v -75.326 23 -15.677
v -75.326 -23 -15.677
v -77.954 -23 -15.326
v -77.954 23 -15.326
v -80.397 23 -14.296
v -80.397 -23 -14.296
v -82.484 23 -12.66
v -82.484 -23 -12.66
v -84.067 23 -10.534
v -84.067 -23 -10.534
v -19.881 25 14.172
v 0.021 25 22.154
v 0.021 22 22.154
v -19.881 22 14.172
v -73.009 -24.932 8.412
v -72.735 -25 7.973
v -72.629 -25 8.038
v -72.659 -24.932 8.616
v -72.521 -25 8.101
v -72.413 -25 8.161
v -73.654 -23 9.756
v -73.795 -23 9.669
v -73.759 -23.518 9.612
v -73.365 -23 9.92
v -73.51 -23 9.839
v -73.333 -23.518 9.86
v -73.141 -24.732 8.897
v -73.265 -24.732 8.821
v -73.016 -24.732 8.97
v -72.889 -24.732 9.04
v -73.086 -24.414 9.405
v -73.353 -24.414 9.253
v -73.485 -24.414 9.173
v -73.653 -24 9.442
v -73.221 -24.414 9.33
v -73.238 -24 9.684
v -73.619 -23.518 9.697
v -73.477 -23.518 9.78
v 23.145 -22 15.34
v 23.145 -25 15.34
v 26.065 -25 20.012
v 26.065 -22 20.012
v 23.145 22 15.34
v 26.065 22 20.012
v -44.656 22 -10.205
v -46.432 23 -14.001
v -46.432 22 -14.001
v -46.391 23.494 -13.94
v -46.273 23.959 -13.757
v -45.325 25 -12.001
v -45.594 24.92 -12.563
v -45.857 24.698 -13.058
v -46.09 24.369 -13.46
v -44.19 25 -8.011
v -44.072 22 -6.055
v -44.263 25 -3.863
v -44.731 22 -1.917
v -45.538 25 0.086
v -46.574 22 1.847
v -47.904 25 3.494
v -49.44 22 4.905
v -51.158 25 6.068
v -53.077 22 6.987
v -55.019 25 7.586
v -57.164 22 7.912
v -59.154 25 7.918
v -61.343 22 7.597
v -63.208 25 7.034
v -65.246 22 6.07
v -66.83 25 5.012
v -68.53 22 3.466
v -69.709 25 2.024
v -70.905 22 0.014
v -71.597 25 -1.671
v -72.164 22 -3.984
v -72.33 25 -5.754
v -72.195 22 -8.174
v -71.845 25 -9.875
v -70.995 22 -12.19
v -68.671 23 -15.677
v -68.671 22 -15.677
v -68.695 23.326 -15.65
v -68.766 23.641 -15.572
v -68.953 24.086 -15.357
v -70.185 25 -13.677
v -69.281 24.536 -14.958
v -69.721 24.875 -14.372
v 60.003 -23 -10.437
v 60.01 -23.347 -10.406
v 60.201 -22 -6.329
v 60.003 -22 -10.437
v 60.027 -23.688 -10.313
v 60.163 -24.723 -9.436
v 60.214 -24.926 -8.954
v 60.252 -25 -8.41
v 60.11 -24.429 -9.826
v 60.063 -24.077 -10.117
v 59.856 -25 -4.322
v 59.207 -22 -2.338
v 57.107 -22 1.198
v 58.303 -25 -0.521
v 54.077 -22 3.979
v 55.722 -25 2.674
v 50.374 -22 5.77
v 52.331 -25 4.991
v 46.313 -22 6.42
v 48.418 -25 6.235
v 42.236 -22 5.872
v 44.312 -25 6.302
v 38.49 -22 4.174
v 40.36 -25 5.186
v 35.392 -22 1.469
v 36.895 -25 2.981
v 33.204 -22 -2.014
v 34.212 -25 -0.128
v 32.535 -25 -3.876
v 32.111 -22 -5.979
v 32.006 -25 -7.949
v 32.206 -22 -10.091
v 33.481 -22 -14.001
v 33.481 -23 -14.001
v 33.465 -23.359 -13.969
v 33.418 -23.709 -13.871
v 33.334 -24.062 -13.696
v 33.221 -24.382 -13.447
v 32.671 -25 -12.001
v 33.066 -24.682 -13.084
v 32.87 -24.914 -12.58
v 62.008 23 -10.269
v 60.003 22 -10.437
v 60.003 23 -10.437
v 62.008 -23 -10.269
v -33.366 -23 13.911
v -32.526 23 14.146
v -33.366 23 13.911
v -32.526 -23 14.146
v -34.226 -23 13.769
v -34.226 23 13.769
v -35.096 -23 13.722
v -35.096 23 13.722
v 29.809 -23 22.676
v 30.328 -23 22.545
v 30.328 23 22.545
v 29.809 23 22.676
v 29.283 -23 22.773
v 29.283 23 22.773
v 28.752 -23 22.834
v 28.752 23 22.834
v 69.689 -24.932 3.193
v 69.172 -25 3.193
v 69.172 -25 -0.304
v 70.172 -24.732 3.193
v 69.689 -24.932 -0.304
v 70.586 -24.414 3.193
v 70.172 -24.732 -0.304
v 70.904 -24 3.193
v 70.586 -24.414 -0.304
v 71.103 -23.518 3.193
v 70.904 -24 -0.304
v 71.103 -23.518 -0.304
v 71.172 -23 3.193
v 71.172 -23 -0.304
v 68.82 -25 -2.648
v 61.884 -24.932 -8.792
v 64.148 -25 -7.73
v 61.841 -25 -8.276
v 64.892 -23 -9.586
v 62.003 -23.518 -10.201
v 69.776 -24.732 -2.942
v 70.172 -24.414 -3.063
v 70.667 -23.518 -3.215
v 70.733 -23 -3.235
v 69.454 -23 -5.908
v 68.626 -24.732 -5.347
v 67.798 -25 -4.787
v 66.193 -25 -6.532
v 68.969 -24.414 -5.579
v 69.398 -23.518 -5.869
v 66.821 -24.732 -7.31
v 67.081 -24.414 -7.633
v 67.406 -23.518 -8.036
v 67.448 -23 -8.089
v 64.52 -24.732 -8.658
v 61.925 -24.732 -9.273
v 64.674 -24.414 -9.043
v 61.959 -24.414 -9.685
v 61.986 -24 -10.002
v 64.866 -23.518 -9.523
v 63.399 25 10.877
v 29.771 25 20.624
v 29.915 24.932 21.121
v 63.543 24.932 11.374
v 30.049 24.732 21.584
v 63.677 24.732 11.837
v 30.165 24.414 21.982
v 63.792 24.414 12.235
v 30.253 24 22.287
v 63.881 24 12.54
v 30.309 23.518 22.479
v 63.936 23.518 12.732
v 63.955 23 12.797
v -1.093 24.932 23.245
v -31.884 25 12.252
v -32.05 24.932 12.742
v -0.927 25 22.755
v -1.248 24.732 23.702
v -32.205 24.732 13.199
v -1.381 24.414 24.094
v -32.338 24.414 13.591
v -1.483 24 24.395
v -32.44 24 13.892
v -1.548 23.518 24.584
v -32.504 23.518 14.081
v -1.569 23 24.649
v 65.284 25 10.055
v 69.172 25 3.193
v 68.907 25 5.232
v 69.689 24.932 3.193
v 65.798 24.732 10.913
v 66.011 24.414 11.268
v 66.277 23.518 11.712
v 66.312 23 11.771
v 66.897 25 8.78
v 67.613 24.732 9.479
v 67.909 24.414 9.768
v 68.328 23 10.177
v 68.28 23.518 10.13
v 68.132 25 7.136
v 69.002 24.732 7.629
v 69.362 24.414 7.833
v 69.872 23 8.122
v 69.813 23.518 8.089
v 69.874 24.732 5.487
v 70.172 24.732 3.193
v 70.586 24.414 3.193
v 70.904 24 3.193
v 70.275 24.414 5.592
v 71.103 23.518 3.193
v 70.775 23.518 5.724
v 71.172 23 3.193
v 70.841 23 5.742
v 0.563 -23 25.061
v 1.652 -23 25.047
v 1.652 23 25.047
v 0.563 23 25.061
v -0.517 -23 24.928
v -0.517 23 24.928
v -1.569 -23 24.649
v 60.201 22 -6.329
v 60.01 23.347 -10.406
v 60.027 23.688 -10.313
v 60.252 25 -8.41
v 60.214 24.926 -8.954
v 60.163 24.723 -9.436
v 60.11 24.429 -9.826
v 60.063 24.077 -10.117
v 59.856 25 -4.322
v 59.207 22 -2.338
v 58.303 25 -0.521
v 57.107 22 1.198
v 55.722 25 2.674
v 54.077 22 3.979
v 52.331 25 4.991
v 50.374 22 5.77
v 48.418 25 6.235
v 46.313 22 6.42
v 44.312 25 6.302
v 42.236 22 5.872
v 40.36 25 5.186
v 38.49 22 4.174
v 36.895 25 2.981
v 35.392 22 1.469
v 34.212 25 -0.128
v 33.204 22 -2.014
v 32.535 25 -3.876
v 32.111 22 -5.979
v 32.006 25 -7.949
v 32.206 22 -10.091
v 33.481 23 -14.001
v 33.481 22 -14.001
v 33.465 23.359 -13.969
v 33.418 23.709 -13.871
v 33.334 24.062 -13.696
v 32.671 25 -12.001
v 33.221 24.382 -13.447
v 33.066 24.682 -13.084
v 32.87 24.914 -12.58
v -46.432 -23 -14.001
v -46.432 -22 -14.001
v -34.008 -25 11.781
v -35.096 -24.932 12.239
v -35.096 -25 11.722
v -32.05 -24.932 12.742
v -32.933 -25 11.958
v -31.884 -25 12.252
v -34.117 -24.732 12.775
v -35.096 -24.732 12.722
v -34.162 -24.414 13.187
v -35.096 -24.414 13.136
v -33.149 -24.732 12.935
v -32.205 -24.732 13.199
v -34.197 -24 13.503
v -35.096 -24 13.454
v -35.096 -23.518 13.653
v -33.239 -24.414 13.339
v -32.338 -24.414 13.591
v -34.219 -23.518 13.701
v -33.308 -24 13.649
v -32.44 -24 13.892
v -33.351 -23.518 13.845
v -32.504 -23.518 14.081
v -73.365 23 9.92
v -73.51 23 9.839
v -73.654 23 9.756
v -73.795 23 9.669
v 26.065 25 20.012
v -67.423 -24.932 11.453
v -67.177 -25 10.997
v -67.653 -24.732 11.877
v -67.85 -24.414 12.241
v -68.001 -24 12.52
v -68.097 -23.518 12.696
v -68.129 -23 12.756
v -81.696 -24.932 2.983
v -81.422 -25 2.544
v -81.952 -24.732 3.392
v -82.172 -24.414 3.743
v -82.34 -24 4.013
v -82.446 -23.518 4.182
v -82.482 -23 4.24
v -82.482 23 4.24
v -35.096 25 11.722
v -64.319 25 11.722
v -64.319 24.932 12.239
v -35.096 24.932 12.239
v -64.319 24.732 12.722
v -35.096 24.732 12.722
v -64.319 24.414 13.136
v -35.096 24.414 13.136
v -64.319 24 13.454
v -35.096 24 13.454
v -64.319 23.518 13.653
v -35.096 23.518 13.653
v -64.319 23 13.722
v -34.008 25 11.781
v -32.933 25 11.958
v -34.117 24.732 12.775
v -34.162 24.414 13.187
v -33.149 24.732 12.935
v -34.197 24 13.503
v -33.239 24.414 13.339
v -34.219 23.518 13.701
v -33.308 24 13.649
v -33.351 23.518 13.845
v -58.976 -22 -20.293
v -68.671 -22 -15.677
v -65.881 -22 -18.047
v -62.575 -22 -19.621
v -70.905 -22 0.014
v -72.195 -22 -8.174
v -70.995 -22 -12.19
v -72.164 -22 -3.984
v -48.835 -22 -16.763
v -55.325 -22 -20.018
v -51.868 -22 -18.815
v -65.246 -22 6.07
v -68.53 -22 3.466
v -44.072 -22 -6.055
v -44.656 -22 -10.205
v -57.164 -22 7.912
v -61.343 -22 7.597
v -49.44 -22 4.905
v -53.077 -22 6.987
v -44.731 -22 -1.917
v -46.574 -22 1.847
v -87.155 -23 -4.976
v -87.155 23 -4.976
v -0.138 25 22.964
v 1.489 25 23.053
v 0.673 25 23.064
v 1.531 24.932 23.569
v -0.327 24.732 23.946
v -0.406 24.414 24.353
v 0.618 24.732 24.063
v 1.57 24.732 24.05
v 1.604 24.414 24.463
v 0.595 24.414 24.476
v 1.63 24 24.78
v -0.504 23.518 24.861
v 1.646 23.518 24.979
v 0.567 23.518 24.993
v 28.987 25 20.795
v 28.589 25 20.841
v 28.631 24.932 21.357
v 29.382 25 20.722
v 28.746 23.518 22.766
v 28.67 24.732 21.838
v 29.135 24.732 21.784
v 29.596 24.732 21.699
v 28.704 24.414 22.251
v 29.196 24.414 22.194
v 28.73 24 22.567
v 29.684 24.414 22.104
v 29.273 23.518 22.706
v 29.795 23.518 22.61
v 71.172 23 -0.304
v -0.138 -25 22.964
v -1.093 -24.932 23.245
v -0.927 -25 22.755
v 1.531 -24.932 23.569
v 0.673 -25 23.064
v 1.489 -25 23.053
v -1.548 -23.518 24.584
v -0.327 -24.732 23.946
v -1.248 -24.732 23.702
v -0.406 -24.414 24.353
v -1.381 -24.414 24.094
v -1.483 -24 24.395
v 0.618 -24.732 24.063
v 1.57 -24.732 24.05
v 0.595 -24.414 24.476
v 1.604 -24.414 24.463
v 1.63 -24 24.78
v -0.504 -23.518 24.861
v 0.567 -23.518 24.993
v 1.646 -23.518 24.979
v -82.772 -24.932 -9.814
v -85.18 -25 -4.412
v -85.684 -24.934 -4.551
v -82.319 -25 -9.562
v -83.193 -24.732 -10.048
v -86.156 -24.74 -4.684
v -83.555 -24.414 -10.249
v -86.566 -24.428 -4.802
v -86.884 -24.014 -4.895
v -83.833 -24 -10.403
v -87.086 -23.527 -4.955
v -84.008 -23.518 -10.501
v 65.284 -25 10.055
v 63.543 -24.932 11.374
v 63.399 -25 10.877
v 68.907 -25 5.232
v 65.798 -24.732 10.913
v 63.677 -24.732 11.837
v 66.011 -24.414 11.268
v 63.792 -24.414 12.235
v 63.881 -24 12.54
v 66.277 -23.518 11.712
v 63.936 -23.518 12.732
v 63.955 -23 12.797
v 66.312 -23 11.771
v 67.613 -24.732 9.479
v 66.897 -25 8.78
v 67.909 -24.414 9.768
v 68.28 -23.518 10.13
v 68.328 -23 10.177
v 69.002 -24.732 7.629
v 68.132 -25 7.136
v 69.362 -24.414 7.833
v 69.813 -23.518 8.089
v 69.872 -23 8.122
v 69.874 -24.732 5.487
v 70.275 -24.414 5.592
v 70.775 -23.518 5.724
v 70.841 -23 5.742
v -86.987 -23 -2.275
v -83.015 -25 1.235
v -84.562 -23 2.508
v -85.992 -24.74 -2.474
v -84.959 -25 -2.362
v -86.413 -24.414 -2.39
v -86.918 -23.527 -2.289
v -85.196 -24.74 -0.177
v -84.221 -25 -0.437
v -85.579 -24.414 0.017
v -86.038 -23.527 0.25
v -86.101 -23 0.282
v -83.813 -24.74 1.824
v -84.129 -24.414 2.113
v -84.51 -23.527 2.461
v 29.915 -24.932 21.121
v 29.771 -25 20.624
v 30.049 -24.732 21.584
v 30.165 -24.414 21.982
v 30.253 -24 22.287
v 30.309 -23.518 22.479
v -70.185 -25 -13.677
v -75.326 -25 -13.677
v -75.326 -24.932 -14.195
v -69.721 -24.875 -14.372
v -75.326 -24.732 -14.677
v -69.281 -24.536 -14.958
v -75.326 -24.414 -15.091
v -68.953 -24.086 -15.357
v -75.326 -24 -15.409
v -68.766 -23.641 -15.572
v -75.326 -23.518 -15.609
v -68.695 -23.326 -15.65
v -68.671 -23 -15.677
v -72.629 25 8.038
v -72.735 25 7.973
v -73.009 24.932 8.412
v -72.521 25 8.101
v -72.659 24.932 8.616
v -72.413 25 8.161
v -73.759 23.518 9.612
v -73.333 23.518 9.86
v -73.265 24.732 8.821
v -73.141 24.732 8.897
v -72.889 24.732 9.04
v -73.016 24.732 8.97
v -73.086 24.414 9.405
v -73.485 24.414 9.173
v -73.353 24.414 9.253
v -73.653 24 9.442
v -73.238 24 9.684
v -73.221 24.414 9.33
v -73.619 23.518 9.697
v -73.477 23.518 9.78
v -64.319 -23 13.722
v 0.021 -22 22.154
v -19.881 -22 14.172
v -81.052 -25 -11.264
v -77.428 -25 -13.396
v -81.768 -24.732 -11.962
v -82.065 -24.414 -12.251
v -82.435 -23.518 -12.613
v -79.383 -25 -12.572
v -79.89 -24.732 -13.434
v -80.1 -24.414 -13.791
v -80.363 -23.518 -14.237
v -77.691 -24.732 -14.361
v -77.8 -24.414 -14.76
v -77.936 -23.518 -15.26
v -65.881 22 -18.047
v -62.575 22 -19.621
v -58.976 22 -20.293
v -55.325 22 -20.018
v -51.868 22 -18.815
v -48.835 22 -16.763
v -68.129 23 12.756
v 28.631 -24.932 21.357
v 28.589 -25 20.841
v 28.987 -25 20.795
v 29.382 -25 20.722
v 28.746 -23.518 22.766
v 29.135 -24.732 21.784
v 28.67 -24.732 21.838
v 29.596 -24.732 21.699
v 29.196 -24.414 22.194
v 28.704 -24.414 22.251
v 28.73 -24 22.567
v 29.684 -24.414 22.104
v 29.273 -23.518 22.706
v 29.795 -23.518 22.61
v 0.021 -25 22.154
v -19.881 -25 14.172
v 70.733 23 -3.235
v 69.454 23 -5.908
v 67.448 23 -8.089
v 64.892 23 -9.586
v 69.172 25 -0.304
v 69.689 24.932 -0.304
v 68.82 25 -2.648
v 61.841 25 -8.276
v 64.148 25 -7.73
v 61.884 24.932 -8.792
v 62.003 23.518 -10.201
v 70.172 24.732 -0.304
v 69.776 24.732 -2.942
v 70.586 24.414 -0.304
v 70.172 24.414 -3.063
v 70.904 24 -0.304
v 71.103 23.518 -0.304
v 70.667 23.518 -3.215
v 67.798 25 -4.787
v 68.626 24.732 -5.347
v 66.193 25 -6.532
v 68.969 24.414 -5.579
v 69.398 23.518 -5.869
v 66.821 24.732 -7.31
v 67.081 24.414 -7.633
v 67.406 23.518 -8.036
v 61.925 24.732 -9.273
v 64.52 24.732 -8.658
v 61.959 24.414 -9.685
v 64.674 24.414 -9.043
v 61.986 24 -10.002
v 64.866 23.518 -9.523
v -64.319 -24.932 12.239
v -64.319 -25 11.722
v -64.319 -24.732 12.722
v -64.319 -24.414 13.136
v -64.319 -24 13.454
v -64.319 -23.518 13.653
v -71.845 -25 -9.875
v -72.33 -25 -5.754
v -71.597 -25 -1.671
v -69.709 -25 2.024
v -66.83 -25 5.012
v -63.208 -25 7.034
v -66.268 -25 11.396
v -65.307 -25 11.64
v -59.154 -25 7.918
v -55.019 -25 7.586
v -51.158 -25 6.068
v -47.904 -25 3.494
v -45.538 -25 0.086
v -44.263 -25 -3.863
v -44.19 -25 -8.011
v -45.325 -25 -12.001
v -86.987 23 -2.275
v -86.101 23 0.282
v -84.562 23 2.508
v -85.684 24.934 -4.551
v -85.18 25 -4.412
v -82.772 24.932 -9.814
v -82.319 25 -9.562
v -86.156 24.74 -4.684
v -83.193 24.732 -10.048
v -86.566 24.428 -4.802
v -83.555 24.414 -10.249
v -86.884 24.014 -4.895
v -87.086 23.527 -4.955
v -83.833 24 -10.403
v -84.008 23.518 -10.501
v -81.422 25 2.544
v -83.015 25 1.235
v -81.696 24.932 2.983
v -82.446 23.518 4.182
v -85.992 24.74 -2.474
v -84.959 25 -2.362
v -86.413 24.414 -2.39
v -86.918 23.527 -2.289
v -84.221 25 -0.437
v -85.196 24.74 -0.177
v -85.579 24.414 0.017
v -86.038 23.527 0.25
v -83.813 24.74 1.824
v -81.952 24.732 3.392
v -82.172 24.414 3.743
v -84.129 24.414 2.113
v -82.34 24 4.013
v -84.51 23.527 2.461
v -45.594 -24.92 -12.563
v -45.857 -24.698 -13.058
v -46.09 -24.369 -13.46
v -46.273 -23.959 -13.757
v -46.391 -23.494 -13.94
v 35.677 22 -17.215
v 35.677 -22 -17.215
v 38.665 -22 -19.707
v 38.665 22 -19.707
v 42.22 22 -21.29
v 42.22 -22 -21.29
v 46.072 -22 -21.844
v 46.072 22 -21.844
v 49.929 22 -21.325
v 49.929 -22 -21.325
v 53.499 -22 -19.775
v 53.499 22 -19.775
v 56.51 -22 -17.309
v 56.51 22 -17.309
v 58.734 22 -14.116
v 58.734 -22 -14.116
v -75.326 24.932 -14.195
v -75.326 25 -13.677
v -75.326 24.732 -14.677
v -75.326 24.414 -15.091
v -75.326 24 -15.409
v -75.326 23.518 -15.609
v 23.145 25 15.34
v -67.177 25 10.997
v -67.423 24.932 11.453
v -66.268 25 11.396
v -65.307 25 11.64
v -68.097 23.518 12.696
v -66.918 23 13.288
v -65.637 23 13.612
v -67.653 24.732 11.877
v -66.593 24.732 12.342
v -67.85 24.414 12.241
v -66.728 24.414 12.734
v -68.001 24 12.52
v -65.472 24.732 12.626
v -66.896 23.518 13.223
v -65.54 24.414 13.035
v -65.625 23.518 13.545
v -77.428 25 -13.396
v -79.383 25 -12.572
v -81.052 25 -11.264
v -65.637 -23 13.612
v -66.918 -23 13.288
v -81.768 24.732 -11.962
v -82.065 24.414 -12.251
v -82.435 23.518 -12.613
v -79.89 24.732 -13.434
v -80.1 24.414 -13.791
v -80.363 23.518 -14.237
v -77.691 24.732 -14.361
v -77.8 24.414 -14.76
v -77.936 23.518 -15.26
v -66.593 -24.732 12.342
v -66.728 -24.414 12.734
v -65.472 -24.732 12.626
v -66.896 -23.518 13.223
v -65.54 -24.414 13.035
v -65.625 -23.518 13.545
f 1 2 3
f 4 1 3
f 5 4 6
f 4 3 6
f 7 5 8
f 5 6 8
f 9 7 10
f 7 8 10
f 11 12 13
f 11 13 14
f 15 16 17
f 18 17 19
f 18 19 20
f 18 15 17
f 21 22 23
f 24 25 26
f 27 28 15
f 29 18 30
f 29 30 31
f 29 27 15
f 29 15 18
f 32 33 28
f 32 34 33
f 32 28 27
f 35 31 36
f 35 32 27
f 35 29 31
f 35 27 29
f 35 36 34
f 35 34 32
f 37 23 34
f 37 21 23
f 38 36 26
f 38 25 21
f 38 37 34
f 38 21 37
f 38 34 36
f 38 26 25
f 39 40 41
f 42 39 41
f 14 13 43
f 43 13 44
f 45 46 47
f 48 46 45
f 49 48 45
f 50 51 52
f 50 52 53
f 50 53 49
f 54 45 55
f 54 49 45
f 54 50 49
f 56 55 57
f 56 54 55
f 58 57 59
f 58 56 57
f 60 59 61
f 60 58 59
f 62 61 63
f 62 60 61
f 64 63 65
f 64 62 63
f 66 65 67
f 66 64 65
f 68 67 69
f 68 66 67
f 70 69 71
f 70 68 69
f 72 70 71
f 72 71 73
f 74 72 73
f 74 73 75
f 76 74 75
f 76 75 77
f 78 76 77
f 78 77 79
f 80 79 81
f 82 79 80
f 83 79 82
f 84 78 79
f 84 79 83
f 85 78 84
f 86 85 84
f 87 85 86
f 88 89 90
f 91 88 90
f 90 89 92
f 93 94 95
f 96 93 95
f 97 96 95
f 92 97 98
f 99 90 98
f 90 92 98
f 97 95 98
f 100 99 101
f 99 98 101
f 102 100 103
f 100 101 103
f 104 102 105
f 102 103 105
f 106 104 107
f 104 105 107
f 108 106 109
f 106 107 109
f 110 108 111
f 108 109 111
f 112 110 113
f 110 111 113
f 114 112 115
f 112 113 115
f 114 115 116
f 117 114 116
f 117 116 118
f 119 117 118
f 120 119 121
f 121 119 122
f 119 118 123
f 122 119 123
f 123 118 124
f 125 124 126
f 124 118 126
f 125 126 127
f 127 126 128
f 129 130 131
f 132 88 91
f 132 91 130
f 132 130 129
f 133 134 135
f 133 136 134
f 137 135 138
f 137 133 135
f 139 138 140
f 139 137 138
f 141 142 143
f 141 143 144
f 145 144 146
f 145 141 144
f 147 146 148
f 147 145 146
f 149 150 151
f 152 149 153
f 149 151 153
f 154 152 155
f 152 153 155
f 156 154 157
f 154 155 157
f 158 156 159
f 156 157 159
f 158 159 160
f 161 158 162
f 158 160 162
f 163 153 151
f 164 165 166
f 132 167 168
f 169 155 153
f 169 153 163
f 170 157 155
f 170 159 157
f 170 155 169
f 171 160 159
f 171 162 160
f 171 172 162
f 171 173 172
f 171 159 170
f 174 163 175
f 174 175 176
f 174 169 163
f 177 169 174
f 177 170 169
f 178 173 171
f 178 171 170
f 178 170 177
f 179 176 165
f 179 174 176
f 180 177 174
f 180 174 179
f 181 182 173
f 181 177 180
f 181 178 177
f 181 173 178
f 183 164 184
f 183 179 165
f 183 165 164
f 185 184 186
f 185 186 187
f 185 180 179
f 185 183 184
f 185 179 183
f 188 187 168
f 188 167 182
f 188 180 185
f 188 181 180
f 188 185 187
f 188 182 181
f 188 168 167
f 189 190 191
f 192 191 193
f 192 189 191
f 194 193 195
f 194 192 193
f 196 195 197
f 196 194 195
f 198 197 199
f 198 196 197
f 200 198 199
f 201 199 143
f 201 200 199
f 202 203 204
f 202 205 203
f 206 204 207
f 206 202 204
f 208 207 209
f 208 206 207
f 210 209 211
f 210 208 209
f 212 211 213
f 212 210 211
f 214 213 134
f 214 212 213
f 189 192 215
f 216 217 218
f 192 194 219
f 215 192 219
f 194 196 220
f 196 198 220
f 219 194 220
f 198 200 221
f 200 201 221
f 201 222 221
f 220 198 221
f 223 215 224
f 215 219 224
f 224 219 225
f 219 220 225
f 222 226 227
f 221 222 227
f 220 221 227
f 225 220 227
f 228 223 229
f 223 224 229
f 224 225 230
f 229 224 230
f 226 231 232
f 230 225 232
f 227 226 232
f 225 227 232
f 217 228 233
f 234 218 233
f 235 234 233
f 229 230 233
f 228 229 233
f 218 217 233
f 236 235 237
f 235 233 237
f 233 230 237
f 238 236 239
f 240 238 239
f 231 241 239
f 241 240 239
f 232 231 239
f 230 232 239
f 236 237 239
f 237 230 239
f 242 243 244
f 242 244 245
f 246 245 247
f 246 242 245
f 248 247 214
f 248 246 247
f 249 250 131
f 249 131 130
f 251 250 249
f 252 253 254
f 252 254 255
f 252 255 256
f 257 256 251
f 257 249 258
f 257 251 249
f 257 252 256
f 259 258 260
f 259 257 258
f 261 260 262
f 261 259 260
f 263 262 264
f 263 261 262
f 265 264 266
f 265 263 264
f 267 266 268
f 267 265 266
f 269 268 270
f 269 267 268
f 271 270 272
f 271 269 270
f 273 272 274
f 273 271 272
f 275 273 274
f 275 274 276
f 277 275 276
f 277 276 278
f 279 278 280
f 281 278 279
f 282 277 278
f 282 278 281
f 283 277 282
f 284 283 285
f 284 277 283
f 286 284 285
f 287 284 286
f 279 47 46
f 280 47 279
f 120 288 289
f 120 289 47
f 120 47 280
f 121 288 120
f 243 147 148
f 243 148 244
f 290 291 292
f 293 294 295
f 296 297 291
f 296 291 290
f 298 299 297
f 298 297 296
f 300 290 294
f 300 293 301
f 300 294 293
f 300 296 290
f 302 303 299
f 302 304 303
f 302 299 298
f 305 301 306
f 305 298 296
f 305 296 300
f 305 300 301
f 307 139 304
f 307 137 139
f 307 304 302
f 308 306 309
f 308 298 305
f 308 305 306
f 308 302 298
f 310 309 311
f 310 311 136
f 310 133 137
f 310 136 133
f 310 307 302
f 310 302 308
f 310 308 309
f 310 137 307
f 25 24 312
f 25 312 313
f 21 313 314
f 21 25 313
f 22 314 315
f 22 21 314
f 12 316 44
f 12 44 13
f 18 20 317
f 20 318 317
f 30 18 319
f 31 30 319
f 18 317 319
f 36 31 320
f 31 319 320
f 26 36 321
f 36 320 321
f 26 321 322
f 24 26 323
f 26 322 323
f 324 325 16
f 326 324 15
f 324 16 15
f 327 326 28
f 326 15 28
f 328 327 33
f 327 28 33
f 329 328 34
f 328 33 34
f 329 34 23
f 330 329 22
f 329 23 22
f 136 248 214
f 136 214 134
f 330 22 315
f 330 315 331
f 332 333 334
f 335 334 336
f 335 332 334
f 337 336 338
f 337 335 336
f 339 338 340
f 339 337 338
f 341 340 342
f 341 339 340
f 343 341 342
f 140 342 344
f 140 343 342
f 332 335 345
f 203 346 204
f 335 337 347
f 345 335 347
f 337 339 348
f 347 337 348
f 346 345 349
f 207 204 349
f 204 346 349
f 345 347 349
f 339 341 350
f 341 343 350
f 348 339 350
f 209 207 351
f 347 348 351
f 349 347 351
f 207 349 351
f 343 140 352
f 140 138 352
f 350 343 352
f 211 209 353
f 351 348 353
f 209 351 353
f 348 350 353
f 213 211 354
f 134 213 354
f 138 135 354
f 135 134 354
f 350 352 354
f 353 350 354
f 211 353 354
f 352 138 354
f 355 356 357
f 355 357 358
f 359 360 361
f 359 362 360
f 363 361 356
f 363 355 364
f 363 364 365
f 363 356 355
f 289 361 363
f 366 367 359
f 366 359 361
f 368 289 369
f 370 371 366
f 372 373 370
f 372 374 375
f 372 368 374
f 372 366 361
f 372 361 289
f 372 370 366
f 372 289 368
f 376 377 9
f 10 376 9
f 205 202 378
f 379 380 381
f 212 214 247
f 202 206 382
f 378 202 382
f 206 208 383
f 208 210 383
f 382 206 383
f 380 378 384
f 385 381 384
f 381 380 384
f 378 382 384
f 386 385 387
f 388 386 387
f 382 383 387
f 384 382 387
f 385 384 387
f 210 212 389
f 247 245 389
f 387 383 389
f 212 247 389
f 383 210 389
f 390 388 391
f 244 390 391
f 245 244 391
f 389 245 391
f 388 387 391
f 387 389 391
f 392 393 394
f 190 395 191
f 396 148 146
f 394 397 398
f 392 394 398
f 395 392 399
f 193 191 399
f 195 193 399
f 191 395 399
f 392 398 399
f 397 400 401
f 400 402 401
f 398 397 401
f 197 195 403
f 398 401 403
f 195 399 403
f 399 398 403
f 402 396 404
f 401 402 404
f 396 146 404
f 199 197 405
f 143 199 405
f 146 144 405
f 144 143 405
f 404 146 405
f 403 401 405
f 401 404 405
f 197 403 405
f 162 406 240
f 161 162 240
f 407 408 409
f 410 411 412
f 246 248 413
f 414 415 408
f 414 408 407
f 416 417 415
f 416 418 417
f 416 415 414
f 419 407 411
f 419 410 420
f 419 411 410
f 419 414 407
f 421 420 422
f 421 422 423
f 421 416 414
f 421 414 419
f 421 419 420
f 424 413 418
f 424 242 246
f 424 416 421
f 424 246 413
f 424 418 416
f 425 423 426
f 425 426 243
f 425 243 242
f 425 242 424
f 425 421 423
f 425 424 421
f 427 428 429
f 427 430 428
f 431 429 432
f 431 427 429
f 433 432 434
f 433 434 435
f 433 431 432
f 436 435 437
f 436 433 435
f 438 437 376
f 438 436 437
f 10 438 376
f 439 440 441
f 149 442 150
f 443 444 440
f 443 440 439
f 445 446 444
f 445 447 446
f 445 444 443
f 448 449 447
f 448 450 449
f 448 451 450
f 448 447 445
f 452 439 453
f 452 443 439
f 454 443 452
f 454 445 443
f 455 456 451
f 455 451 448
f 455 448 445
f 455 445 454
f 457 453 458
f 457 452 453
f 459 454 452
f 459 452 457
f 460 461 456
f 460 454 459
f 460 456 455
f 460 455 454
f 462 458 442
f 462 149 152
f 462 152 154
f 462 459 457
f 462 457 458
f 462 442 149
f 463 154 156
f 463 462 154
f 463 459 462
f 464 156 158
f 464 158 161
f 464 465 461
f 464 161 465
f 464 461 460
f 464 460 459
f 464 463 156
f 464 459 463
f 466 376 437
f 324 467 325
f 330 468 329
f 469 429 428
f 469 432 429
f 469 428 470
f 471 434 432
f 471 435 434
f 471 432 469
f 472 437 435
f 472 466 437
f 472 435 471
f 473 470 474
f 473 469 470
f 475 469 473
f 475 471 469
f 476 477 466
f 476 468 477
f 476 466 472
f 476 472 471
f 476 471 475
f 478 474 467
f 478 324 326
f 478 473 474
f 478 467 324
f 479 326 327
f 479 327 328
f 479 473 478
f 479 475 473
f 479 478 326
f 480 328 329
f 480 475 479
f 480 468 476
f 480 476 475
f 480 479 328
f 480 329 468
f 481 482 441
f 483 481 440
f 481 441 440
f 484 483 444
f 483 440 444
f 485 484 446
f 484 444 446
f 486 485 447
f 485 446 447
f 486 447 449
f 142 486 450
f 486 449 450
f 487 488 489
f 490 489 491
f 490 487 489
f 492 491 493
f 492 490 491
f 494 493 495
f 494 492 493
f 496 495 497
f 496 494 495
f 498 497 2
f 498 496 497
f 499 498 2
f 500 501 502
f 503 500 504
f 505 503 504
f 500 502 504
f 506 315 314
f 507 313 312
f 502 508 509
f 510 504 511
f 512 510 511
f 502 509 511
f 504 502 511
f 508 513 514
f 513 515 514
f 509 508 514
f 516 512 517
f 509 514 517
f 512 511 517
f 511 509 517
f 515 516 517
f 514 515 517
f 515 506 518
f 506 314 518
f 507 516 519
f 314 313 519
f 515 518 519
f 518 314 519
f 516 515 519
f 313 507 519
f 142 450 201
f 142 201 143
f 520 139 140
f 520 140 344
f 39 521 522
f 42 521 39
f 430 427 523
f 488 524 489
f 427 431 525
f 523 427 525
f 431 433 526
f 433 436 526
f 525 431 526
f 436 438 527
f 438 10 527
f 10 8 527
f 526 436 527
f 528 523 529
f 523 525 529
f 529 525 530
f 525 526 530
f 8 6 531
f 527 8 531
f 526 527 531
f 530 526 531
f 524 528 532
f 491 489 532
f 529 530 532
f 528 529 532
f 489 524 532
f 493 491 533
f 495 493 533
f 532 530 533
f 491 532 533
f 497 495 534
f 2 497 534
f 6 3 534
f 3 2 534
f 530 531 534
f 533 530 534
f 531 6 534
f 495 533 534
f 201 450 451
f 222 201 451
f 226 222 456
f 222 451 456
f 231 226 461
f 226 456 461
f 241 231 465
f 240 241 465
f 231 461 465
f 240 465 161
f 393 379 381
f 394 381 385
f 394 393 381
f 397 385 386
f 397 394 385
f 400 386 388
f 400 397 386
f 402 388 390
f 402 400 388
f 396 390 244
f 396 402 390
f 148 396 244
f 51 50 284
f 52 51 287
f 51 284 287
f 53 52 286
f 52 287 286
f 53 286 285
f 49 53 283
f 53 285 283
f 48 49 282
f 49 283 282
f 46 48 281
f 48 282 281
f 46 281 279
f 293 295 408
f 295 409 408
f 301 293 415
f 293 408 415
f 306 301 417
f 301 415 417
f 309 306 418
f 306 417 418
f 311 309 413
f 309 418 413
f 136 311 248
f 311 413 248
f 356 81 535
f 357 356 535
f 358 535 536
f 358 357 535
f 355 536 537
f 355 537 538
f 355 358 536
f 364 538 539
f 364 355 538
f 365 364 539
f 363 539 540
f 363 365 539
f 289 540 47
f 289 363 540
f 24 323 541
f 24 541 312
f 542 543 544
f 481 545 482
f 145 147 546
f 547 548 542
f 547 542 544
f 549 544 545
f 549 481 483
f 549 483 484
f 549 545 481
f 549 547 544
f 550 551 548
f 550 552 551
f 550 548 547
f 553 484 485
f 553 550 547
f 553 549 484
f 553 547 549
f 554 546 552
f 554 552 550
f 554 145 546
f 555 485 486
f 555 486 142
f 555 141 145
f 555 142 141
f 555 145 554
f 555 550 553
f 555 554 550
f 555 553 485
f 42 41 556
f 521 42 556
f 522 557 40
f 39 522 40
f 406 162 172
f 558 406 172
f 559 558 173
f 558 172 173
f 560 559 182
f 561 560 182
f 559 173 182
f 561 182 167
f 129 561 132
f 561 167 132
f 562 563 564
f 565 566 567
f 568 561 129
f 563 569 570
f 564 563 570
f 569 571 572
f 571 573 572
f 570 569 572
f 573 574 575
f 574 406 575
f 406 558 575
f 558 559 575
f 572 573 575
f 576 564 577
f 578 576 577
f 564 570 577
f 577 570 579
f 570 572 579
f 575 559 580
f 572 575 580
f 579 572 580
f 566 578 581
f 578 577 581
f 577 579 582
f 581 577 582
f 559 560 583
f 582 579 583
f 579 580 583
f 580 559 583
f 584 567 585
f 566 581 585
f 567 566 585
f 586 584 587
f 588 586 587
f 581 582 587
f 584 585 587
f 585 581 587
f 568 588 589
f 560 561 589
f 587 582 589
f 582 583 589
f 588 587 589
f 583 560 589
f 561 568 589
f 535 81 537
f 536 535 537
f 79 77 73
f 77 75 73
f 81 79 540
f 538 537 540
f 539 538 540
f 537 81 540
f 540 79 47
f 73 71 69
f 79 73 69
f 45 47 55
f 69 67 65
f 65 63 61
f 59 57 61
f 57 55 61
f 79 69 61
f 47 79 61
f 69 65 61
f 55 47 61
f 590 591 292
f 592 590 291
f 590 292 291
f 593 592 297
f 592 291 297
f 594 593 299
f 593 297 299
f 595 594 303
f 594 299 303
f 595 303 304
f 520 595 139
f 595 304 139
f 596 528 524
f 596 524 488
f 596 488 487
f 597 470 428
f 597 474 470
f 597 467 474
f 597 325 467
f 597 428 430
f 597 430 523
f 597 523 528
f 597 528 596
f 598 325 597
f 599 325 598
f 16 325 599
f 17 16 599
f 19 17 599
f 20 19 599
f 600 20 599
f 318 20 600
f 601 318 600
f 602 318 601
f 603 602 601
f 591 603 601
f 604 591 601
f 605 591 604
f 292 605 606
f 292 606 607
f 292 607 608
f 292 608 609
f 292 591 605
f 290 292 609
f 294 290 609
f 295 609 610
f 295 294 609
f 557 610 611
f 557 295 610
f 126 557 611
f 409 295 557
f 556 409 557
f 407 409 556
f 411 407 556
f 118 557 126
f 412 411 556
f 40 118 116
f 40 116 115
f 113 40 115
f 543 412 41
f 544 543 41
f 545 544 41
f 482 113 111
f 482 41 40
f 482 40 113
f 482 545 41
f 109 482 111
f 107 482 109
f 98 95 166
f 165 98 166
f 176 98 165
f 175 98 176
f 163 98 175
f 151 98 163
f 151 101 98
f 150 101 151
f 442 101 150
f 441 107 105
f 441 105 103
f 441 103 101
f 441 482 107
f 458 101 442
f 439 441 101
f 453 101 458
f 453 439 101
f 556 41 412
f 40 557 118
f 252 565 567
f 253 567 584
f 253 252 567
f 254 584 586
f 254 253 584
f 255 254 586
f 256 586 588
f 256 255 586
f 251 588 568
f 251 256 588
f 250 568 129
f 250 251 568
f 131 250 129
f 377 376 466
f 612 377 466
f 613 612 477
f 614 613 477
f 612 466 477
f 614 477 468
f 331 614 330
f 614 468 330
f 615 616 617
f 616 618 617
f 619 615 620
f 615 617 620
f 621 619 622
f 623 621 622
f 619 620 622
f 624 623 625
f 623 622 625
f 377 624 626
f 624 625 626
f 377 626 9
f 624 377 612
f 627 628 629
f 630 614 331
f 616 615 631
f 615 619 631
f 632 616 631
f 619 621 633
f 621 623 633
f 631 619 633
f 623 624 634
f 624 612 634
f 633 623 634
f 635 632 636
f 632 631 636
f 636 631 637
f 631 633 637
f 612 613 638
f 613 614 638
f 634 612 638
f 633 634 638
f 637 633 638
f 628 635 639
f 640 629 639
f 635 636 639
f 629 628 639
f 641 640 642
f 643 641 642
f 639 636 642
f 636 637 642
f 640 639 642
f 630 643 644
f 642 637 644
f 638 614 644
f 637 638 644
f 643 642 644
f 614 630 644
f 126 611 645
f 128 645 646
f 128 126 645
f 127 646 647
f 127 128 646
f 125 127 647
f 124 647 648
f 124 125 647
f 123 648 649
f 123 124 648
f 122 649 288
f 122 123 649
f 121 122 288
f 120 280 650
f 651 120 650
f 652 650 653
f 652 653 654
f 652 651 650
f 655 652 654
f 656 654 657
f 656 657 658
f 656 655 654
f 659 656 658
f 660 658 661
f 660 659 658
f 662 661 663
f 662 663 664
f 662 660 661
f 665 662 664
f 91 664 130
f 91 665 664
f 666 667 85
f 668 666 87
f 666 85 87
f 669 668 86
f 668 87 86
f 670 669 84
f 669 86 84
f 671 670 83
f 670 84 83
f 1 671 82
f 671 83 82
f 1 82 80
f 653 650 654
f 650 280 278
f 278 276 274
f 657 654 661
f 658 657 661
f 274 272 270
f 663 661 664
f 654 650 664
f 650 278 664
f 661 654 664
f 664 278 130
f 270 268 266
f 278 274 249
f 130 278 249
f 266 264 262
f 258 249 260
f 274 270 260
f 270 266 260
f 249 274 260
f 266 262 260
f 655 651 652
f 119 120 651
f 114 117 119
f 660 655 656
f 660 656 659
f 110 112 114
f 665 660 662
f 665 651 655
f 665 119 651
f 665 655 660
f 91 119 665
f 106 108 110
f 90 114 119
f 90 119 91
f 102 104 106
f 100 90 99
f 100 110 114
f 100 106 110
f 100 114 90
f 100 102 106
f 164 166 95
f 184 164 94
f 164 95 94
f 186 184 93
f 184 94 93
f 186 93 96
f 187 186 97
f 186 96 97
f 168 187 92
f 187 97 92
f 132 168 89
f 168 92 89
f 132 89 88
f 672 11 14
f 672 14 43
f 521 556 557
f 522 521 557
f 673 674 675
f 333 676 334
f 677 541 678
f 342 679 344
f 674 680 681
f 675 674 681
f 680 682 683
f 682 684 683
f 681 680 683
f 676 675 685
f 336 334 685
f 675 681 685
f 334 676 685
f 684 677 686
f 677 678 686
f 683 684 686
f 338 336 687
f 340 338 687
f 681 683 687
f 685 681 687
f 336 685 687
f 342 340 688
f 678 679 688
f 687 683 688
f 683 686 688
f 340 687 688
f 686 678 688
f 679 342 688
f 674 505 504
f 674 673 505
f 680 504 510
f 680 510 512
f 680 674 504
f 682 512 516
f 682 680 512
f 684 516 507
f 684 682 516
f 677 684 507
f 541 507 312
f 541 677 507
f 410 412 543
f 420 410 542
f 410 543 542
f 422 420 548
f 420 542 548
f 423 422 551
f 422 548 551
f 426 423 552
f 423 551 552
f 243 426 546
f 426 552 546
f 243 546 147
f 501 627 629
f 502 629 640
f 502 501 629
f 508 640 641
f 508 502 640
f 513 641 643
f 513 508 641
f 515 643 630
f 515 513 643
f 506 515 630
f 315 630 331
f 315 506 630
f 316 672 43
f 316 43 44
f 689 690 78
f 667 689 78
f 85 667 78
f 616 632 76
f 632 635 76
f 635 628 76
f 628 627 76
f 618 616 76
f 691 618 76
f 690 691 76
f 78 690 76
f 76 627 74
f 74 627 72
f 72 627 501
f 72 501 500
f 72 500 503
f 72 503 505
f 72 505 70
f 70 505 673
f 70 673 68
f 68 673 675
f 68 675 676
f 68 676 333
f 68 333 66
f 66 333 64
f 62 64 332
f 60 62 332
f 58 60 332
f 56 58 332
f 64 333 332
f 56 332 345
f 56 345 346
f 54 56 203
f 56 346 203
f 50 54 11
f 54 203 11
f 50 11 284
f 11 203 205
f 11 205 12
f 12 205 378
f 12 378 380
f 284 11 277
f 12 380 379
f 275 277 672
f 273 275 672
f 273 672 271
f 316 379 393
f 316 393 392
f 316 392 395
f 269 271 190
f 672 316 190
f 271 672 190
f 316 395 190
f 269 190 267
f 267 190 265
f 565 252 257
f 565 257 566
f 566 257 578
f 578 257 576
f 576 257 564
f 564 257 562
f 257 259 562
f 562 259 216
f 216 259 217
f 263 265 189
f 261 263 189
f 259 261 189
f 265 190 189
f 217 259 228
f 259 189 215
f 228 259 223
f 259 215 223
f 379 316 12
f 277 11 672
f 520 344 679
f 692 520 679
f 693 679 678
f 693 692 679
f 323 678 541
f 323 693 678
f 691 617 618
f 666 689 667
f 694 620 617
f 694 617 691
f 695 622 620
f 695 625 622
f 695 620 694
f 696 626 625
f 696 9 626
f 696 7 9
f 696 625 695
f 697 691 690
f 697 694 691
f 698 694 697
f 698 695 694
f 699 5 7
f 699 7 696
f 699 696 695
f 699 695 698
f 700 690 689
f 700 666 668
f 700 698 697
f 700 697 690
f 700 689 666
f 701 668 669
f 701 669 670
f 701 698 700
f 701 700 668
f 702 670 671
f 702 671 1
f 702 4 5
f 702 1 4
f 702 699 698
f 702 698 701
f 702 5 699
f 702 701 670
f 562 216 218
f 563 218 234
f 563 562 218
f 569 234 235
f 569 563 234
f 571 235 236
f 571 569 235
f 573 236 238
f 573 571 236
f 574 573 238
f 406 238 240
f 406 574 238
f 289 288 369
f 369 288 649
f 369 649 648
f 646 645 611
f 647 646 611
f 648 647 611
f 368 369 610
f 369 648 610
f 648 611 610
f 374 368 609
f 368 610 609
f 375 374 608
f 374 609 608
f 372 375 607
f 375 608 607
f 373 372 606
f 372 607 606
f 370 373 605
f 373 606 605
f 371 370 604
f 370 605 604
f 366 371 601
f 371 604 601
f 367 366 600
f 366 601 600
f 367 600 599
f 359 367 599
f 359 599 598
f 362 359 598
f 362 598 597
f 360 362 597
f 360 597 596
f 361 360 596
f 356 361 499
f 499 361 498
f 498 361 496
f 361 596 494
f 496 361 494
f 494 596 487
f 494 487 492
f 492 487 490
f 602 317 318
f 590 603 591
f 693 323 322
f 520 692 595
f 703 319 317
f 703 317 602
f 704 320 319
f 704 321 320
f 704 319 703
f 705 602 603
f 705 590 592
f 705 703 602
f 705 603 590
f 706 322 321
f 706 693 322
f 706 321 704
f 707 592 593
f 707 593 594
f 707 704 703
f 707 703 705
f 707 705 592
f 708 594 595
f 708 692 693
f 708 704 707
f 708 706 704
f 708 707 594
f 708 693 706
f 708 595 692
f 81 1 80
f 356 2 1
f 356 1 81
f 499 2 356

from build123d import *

# Parameters (mm, degrees)
F1_DEPTH    = 25
F2_T1_DEPTH = 25
F2_T3_DEPTH = 33.2865856195
F2_T5_DEPTH = 35.1375068729
F2_T7_DEPTH = 26.2439265081
F2_T9_DEPTH = 29.0269565503
F3_T1_DEPTH = 64.9996021944
F3_T3_DEPTH = 54.4201853444
F3_T5_DEPTH = 62.5652900515
F3_T7_DEPTH = 70.9771112235
F4_R        = 14.1322148091
F5_DEPTH    = 3
F6_R        = 2


# Not quite as in the source:
# - a fillet or chamfer that OpenCascade refuses, or shapes differently, is made with other operations: its cross-section is extruded or revolved along the edge and cut away or added


with BuildPart() as f1:
    # F0 (on Front) → F1 (new body)
    with BuildSketch(Plane.XZ):
        with BuildLine():
            Line((-81.2098225326, -15.6771827859), (-68.6711987798, -15.6771827859))
            ThreePointArc((-68.6711987798, -15.6771827859), (-57.1419560716, -20.274533801), (-46.4318082669, -14.0014318744))
            Line((-46.4318082669, -14.0014318744), (33.4813362922, -14.0014318744))
            ThreePointArc((33.4813362922, -14.0014318744), (48.0187694937, -21.717844135), (60.0034566781, -10.4374516171))
            Line((60.0034566781, -10.4374516171), (71.1715072393, -9.4995843247))
            Line((71.1715072393, -9.4995843247), (71.1715072393, 10.7058854774))
            Line((71.1715072393, 10.7058854774), (29.5542683452, 22.7688532323))
            Line((29.5542683452, 22.7688532323), (0, 25.1814462245))
            Line((0, 25.1814462245), (-33.7763093412, 13.7216281146))
            Line((-33.7763093412, 13.7216281146), (-66.3463175297, 13.7216281146))
            Line((-66.3463175297, 13.7216281146), (-73.5840946436, 9.8011633381))
            Line((-73.5840946436, 9.8011633381), (-89.2659574747, 0))
            Line((-89.2659574747, 0), (-87.1549323201, -4.9759717658))
            Line((-87.1549323201, -4.9759717658), (-81.2098225326, -15.6771827859))
        make_face()
    extrude(amount=F1_DEPTH)

    # F2: fillet of radius 8 on 5 edges, made by hand

    # F2_s2 → F2_t1 (join)
    with BuildSketch(Plane.XZ):
        with BuildLine():
            ThreePointArc((-32.5261230106, 14.1457984349), (-33.7939263524, 13.8283829823), (-35.0964935411, 13.7216281146))
            Line((-35.0964935411, 13.7216281146), (-33.7763093412, 13.7216281146))
            Line((-33.7763093412, 13.7216281146), (-32.5261230106, 14.1457984349))
        make_face()
    extrude(amount=F2_T1_DEPTH)

    # F2_s4 → F2_t3 (cut)
    with BuildSketch(Plane.XZ.offset(-4.1432928098)):
        with BuildLine():
            ThreePointArc((1.6518224825, 25.0466035919), (0.0208109602, 25.012860503), (-1.569444032, 24.6489563376))
            Line((-1.569444032, 24.6489563376), (0, 25.1814462245))
            Line((0, 25.1814462245), (1.6518224825, 25.0466035919))
        make_face()
    extrude(amount=F2_T3_DEPTH, mode=Mode.SUBTRACT)

    # F2_s6 → F2_t5 (cut)
    with BuildSketch(Plane.XZ.offset(-5.0687534365)):
        with BuildLine():
            ThreePointArc((-64.3188161551, 13.7216281146), (-66.284181416, 13.4764549593), (-68.1290829763, 12.7559629624))
            Line((-68.1290829763, 12.7559629624), (-66.3463175297, 13.7216281146))
            Line((-66.3463175297, 13.7216281146), (-64.3188161551, 13.7216281146))
        make_face()
    extrude(amount=F2_T5_DEPTH, mode=Mode.SUBTRACT)

    # F2_s8 → F2_t7 (cut)
    with BuildSketch(Plane.XZ.offset(-0.6219632541)):
        with BuildLine():
            ThreePointArc((-73.365339754, 9.9196556357), (-73.5821478307, 9.7978216209), (-73.7950641631, 9.669307401))
            Line((-73.7950641631, 9.669307401), (-73.5840946436, 9.8011633381))
            Line((-73.5840946436, 9.8011633381), (-73.365339754, 9.9196556357))
        make_face()
    extrude(amount=F2_T7_DEPTH, mode=Mode.SUBTRACT)

    # F2_s10 → F2_t9 (cut)
    with BuildSketch(Plane.XZ.offset(-2.0134782752)):
        with BuildLine():
            ThreePointArc((30.3278196103, 22.544635475), (29.5469574945, 22.7290808385), (28.751547216, 22.8343814784))
            Line((28.751547216, 22.8343814784), (29.5542683452, 22.7688532323))
            Line((29.5542683452, 22.7688532323), (30.3278196103, 22.544635475))
        make_face()
    extrude(amount=F2_T9_DEPTH, mode=Mode.SUBTRACT)

    # F3: fillet of radius 10 on 4 edges, made by hand

    # F3_s2 → F3_t1 (cut)
    with BuildSketch(Plane.XZ.offset(-19.9998010972)):
        with BuildLine():
            ThreePointArc((-87.1549323201, -4.9759717658), (-86.1010433194, 0.2823042988), (-82.4820383293, 4.239949063))
            Line((-82.4820383293, 4.239949063), (-89.2659574747, 0))
            Line((-89.2659574747, 0), (-87.1549323201, -4.9759717658))
        make_face()
    extrude(amount=F3_T1_DEPTH, mode=Mode.SUBTRACT)

    # F3_s4 → F3_t3 (cut)
    with BuildSketch(Plane.XZ.offset(-14.7100926722)):
        with BuildLine():
            ThreePointArc((-75.3257854638, -15.6771827859), (-80.3970650538, -14.2958905382), (-84.0673608071, -10.5336074498))
            Line((-84.0673608071, -10.5336074498), (-81.2098225326, -15.6771827859))
            Line((-81.2098225326, -15.6771827859), (-75.3257854638, -15.6771827859))
        make_face()
    extrude(amount=F3_T3_DEPTH, mode=Mode.SUBTRACT)

    # F3_s6 → F3_t5 (cut)
    with BuildSketch(Plane.XZ.offset(-18.7826450258)):
        with BuildLine():
            ThreePointArc((63.9554677121, 12.7974911304), (69.1664933159, 9.1995068855), (71.1715072393, 3.1928274671))
            Line((71.1715072393, 3.1928274671), (71.1715072393, 10.7058854774))
            Line((71.1715072393, 10.7058854774), (63.9554677121, 12.7974911304))
        make_face()
    extrude(amount=F3_T5_DEPTH, mode=Mode.SUBTRACT)

    # F3_s8 → F3_t7 (cut)
    with BuildSketch(Plane.XZ.offset(-22.9885556118)):
        with BuildLine():
            ThreePointArc((71.1715072393, -0.30416208), (68.532496131, -7.0729021797), (62.0083387319, -10.2690862168))
            Line((62.0083387319, -10.2690862168), (71.1715072393, -9.4995843247))
            Line((71.1715072393, -9.4995843247), (71.1715072393, -0.30416208))
        make_face()
    extrude(amount=F3_T7_DEPTH, mode=Mode.SUBTRACT)

    # F4 (on face) → F5 (cut)
    with BuildSketch(Plane.XZ.offset(25)):
        Polygon((0.0208109602, 22.1540294588), (-19.880797714, 14.1719523817), (23.1445431709, 15.3400599957), (26.0648149997, 20.0124960393), align=None)
        with Locations((-58.2038164139, -6.1822682619)):
            Circle(F4_R)
        with Locations((46.1366328286, -7.7115220987)):
            Circle(F4_R)
    extrude(amount=-F5_DEPTH, mode=Mode.SUBTRACT)

    # F6
    f6_edges = [f1.edges().sort_by_distance(p)[0] for p in [
        (-71.998492, -25, -15.677183),
        (-86.101043, -25, 0.282304),
        (-78.138551, -25, 6.954628),
        (-6.475236, -25, -14.001432),
        (-80.397065, -25, -14.295891),
        (-85.611147, -25, -7.75479),
        (-73.582148, -25, 9.797822),
        (-70.747211, -25, 11.337809),
        (-66.284181, -25, 13.476455),
        (-49.707655, -25, 13.721628),
        (-33.793926, -25, 13.828383),
        (-17.047784, -25, 19.397377),
        (0.020811, -25, 25.012861),
        (15.201685, -25, 23.940493),
        (29.546957, -25, 22.729081),
        (47.141644, -25, 17.671063),
        (69.166493, -25, 9.199507),
        (71.171507, -25, 1.444333),
        (68.532496, -25, -7.072902),
        (61.005898, -25, -10.353269),
    ]]
    fillet(f6_edges, radius=F6_R)

    # F7: F1 across plane


with BuildPart() as f1_1:
    add(f1.part)
    add(f1.part.mirror(Plane.XZ))


solid = f1_1.part
